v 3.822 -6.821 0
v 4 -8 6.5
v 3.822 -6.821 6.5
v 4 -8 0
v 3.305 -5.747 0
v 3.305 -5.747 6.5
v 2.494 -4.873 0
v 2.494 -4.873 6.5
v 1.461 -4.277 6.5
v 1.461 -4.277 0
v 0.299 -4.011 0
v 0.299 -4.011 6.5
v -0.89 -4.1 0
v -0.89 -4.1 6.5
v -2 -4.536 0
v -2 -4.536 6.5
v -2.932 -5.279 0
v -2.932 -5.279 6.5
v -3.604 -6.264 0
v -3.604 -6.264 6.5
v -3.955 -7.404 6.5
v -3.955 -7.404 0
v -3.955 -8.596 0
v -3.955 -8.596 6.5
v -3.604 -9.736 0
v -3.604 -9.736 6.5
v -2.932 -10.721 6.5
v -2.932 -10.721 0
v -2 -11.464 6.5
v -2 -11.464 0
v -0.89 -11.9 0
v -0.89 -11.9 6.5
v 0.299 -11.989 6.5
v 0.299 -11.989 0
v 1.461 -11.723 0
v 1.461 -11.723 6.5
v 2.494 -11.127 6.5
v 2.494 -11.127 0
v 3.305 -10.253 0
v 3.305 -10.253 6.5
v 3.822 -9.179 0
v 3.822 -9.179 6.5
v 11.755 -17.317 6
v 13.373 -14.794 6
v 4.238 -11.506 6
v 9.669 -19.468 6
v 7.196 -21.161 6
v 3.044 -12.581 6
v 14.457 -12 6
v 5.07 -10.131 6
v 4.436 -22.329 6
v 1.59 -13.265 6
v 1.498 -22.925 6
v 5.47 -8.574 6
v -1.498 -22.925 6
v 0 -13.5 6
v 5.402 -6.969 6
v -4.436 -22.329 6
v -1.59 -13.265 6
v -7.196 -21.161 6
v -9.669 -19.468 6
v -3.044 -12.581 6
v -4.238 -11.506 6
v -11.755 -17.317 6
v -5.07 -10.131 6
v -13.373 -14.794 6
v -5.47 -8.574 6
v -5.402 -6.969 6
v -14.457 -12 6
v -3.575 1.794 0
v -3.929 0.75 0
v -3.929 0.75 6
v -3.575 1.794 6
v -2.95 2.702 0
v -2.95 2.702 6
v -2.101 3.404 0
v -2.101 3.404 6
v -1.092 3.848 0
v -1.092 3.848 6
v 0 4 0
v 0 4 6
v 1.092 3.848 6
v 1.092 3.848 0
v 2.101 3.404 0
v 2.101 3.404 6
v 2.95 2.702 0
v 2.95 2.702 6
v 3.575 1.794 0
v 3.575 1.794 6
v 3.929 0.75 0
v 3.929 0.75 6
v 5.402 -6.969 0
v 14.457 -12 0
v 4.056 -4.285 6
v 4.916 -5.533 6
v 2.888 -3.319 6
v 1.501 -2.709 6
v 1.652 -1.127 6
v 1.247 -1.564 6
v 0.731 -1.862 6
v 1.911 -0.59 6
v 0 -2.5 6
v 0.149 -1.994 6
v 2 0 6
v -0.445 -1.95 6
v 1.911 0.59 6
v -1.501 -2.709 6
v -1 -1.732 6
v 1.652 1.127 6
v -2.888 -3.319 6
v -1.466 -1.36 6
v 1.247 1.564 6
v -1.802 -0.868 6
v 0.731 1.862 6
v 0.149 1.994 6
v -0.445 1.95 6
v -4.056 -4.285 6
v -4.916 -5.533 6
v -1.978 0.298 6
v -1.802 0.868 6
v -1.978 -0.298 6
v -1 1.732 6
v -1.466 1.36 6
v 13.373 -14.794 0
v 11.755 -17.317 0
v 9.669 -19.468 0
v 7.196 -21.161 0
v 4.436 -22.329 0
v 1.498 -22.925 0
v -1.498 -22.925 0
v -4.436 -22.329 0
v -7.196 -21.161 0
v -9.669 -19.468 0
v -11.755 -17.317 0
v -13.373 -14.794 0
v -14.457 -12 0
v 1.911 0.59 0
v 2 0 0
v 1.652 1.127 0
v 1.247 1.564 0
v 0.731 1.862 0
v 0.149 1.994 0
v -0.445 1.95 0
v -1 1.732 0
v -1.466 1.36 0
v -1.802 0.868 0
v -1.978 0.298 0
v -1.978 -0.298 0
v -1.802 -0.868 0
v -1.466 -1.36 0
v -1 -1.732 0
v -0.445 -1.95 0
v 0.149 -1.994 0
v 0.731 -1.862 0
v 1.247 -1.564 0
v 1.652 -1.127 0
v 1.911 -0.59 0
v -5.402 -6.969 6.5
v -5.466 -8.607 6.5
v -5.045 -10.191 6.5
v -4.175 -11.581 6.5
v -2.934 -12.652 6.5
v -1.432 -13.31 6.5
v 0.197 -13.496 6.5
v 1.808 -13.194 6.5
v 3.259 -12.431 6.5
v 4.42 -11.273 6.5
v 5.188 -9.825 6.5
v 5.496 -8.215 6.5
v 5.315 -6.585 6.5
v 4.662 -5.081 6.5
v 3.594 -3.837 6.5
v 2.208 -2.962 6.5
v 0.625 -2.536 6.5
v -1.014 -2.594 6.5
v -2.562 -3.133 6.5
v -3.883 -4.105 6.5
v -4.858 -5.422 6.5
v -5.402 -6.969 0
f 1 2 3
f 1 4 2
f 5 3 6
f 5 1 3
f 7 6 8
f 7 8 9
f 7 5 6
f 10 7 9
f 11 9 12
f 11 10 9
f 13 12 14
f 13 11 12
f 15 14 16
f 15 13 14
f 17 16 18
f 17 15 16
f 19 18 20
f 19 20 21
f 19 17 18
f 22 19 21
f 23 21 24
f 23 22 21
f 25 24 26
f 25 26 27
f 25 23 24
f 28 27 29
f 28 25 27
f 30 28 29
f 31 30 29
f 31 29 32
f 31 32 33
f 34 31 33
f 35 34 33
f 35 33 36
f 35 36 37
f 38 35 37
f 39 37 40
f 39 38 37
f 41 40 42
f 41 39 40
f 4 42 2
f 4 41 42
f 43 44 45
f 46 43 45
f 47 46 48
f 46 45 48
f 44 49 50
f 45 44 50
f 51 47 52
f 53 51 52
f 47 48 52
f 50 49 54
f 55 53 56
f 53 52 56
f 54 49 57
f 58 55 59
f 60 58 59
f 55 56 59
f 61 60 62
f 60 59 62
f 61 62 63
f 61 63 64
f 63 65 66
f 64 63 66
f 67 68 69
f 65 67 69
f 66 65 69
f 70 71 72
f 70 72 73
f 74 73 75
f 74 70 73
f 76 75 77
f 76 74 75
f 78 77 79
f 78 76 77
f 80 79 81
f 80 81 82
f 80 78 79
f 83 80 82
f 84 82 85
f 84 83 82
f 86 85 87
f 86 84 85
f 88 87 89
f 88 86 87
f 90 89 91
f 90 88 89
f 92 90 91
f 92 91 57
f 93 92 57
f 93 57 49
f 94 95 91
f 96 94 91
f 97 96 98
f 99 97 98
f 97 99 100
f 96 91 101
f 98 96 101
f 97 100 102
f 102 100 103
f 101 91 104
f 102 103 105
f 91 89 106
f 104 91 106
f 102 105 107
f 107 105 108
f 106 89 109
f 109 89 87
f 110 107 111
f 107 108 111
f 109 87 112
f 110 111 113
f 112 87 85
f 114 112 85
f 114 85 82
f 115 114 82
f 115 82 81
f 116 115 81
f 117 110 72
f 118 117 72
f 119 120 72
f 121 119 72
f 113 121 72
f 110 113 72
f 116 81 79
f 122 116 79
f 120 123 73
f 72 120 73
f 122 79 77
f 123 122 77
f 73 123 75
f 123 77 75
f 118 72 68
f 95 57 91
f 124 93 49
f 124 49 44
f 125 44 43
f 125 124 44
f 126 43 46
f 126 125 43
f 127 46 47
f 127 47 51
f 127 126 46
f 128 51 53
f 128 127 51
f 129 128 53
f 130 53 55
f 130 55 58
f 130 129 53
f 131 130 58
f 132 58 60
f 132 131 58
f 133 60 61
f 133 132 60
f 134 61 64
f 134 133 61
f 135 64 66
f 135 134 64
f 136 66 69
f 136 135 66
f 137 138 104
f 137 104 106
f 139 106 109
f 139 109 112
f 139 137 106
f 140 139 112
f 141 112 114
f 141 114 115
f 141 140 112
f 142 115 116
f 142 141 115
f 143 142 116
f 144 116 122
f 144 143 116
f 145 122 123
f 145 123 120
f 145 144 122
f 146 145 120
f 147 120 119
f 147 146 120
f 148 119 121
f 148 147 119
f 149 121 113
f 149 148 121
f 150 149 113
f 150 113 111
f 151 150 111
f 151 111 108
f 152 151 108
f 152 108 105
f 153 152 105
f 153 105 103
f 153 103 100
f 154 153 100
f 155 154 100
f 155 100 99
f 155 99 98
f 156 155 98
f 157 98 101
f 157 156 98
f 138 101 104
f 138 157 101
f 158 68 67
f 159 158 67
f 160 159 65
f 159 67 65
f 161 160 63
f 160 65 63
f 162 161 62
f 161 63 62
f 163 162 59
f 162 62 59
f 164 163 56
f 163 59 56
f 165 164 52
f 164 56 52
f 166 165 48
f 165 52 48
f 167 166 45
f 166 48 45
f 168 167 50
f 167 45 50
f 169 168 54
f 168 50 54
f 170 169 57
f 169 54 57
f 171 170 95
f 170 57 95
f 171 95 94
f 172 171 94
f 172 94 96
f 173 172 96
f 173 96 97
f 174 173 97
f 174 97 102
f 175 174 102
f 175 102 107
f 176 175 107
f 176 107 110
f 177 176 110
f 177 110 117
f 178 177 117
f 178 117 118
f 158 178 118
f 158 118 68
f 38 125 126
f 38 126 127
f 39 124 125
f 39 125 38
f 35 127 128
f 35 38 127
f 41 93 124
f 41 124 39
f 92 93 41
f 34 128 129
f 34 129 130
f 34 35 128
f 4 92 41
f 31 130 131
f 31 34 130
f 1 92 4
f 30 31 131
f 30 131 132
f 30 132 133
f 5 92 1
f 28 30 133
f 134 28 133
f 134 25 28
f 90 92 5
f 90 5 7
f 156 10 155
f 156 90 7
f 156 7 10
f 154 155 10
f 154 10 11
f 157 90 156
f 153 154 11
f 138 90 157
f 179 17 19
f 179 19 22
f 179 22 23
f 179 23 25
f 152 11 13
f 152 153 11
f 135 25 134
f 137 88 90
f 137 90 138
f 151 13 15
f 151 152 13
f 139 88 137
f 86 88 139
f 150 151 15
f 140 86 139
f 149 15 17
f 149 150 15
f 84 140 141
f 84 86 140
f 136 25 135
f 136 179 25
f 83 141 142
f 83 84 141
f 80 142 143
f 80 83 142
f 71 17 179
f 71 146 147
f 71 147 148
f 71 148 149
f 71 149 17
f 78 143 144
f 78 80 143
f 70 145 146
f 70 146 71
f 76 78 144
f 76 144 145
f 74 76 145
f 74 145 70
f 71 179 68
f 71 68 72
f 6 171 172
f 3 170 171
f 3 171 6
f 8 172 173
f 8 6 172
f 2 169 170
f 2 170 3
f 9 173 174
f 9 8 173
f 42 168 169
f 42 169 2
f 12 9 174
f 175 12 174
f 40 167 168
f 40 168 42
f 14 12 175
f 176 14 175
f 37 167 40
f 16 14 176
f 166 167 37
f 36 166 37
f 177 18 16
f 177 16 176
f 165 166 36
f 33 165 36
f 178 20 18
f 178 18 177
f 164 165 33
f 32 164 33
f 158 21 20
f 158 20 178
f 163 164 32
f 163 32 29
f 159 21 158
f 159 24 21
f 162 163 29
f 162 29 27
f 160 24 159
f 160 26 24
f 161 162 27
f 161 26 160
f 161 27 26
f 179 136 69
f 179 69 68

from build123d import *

# Parameters (mm, degrees)
SKETCH1_R           = 2
SKETCH1_R_2         = 4
BOSS_EXTRUDE1_DEPTH = 6
SKETCH2_R           = 5.5
BOSS_EXTRUDE2_DEPTH = 0.5
CUT_EXTRUDE1_START  = -10.5
SKETCH3_R           = 4
CUT_EXTRUDE1_DEPTH  = 10.5


with BuildPart() as part:
    # Sketch1 → Boss-Extrude1 (new body)
    with BuildSketch(Plane.XY):
        with BuildLine():
            Line((-5.402455316, -6.96875), (-3.929058411, 0.75))
            ThreePointArc((-3.929058411, 0.75), (0, 4), (3.929058411, 0.75))
            Line((3.929058411, 0.75), (5.402455316, -6.96875))
            Line((5.402455316, -6.96875), (14.456832295, -12))
            ThreePointArc((14.456832295, -12), (0, -23), (-14.456832295, -12))
            Line((-14.456832295, -12), (-5.402455316, -6.96875))
        make_face()
        Circle(SKETCH1_R, mode=Mode.SUBTRACT)
        with Locations((0, -8)):
            Circle(SKETCH1_R_2, mode=Mode.SUBTRACT)
    extrude(amount=BOSS_EXTRUDE1_DEPTH)

    # Sketch2 → Boss-Extrude2 (add)
    with BuildSketch(Plane.XY.offset(6)):
        with Locations(Location((0, -8, 0), (0, 0, 169.193077125))):
            Circle(SKETCH2_R)
    extrude(amount=BOSS_EXTRUDE2_DEPTH)

    # Sketch3 → Cut-Extrude1 (cut)
    with BuildSketch(Plane.XY.offset(6.5).offset(CUT_EXTRUDE1_START)):
        with Locations((0, -8)):
            Circle(SKETCH3_R)
    extrude(amount=CUT_EXTRUDE1_DEPTH, mode=Mode.SUBTRACT)


solid = part.part
